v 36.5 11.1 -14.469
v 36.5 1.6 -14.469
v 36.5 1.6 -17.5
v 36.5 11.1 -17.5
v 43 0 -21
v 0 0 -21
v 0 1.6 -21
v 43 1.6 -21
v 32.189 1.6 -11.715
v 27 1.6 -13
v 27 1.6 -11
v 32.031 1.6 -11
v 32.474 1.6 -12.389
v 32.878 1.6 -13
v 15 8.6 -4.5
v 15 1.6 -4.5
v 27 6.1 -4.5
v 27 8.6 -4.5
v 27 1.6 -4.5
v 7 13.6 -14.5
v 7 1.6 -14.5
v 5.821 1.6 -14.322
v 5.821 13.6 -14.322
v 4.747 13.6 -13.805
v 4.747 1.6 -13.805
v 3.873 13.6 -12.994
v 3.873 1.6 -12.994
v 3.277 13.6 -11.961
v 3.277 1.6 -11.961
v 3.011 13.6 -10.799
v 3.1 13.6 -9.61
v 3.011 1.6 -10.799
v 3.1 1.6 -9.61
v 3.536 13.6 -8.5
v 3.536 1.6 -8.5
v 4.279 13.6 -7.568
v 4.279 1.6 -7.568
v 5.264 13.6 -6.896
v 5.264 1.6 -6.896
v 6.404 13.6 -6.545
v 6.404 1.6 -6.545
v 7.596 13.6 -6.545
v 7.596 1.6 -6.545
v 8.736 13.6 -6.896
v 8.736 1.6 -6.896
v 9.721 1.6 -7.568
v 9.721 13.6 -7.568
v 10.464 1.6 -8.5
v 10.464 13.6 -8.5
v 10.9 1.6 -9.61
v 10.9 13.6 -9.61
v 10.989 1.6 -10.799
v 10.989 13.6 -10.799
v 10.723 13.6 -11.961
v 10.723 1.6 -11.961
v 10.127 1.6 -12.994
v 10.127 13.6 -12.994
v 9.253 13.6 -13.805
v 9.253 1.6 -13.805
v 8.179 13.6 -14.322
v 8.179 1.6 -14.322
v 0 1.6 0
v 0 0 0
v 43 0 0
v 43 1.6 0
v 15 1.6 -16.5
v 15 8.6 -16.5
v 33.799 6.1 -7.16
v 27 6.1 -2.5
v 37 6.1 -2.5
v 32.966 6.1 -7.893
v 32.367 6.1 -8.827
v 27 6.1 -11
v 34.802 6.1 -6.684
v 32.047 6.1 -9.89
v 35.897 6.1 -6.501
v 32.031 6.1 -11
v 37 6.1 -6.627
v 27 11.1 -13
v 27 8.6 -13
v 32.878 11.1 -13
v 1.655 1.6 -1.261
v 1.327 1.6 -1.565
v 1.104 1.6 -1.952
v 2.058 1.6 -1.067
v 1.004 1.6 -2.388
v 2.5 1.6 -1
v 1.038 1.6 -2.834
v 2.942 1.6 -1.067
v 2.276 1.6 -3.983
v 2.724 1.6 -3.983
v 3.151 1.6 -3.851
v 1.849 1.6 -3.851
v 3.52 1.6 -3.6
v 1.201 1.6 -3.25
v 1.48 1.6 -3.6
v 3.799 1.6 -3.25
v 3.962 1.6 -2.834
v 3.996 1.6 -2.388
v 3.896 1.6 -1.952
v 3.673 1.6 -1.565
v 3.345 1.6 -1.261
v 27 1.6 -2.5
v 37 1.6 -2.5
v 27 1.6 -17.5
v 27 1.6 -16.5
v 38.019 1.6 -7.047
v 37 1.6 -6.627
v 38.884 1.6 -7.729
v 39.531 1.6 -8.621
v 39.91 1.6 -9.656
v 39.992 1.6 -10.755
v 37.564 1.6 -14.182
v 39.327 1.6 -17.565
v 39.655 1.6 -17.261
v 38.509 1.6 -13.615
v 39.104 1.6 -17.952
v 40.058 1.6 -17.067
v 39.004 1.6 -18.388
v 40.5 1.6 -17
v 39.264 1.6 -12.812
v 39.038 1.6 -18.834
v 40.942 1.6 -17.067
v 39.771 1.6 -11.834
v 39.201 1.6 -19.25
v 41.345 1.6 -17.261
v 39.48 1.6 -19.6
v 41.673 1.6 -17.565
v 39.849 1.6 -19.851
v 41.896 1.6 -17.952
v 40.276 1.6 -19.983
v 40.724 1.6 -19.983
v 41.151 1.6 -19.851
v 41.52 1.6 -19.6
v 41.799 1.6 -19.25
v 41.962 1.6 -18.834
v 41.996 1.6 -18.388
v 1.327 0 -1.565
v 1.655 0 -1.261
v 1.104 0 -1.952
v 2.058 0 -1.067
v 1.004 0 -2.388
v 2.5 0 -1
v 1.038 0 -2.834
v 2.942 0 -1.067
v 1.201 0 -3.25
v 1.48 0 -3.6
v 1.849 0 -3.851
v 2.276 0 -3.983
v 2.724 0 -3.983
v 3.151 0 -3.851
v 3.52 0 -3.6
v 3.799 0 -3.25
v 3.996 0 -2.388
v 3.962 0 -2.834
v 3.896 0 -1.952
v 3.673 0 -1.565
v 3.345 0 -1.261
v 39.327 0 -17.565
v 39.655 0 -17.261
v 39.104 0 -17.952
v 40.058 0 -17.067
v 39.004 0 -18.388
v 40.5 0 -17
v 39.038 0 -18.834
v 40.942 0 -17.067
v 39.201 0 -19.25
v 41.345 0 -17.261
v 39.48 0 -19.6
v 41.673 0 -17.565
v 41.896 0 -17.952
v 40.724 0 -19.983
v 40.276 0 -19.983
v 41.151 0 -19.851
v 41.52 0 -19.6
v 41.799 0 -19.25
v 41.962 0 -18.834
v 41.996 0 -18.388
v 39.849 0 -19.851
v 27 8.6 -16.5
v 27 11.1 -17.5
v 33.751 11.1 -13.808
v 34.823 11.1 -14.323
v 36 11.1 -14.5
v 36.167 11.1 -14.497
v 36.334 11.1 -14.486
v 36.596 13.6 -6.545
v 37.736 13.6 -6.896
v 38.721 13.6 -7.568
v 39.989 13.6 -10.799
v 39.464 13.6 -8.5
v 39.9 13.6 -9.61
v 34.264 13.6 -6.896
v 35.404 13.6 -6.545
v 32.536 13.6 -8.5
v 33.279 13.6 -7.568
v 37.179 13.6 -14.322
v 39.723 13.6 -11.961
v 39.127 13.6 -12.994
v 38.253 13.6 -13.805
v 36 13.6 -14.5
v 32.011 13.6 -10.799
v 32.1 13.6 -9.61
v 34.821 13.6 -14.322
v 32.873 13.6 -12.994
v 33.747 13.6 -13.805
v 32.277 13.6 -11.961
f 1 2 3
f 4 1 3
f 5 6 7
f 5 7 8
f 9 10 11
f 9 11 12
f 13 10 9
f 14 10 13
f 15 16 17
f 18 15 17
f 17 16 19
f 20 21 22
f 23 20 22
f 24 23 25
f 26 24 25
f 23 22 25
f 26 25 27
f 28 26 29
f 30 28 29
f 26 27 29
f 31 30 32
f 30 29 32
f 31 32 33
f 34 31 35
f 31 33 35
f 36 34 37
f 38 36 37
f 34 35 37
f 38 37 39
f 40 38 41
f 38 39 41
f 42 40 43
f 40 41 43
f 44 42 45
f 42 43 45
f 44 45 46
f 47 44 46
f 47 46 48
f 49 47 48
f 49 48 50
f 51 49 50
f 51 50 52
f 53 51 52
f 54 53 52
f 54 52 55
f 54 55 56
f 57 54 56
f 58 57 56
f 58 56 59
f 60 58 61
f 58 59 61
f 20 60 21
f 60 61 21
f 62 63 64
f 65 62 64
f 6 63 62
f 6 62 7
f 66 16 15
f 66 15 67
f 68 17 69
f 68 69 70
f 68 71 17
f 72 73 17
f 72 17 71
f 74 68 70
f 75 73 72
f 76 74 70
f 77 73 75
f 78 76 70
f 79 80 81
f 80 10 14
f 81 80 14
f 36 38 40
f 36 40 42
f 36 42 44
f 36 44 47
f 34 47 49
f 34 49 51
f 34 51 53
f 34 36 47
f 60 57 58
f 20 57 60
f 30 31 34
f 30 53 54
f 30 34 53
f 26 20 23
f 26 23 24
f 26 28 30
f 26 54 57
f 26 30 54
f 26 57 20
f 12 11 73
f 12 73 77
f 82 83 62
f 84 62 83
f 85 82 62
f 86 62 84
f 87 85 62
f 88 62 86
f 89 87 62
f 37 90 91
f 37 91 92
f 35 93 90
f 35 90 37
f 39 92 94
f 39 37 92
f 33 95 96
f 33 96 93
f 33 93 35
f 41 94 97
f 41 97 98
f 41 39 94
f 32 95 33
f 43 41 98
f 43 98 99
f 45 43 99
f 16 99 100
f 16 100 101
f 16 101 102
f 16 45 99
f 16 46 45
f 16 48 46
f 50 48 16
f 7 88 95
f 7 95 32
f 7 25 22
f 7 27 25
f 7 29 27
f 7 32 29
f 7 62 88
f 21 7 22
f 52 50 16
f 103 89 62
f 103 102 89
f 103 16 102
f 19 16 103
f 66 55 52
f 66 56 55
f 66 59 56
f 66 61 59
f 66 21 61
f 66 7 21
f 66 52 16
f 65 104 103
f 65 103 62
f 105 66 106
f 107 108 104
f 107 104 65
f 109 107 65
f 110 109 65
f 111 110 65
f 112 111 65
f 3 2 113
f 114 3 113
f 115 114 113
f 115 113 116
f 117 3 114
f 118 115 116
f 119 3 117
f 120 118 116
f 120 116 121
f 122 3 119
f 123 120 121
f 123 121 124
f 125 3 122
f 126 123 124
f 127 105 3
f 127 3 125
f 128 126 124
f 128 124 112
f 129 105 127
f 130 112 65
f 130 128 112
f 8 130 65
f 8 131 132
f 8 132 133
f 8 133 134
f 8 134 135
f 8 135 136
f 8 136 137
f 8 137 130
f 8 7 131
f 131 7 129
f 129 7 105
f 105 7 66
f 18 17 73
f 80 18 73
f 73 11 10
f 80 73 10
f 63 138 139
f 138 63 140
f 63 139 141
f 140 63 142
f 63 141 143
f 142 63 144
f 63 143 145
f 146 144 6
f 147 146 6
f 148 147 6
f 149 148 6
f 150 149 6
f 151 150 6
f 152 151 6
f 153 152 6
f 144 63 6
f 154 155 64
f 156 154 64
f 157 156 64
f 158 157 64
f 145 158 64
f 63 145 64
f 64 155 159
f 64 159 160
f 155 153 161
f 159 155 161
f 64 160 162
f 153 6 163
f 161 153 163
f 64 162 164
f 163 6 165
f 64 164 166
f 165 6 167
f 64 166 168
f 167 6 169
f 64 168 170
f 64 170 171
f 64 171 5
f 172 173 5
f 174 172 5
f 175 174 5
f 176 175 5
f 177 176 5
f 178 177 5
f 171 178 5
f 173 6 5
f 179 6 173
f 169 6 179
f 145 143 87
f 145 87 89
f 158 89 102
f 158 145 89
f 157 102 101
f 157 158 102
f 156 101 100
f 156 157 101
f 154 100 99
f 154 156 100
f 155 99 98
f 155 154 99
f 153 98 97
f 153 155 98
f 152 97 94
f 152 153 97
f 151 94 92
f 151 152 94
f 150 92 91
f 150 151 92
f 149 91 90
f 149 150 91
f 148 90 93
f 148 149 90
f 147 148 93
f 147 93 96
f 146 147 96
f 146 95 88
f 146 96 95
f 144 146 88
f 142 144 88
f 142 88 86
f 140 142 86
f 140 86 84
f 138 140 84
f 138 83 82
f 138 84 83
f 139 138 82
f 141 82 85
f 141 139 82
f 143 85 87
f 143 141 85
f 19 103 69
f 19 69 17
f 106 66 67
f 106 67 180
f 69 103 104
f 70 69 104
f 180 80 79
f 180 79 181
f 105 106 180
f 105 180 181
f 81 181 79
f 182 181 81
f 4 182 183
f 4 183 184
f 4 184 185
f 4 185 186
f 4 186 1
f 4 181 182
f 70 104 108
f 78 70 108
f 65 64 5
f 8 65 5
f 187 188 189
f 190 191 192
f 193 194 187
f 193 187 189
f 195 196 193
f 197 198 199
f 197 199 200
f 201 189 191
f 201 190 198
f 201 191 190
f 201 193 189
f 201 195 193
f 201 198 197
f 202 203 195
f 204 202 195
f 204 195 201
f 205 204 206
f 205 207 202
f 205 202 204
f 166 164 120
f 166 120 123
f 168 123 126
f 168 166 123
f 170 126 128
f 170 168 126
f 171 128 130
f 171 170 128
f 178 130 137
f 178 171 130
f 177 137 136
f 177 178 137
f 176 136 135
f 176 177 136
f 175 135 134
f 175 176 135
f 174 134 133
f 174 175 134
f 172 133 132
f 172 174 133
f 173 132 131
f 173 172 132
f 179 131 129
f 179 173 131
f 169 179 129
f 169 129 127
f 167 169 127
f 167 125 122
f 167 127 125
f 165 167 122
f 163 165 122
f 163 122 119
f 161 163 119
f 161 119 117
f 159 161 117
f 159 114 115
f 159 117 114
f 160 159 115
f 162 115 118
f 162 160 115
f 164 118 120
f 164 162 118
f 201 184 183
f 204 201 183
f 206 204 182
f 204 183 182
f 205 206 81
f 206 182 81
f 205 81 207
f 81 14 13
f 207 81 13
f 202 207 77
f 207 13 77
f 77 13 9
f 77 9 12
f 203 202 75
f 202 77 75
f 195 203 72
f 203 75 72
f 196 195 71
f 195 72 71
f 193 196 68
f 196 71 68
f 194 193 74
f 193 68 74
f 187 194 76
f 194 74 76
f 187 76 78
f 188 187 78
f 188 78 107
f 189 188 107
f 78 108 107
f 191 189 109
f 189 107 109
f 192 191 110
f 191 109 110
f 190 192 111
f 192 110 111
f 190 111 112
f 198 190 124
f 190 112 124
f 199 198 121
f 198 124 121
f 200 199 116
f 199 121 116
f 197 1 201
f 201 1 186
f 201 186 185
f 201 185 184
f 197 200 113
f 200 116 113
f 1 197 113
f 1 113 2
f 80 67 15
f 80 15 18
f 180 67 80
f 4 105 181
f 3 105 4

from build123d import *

# Parameters (mm, degrees)
SKETCH1_W               = 43
SKETCH1_H               = 21
PCB_DEPTH               = 1.6
MOUNT_HOLE_1_DEPTH      = 48.880685041
MOUNT_HOLE_1_DEPTH_BACK = 48.880685041
SKETCH2_R               = 1.5
MOUNT_HOLE_2_DEPTH      = 48.880685041
MOUNT_HOLE_2_DEPTH_BACK = 48.880685041
SKETCH3_R               = 1.5
INDUCTOR_START          = 1.6
SKETCH4_W               = 12
SKETCH4_H               = 12
INDUCTOR_DEPTH          = 7
CAP_IN_START            = 1.6
SKETCH5_R               = 4
CAP_IN_DEPTH            = 12
CAP_OUT_START           = 1.6
SKETCH6_R               = 4
CAP_OUT_DEPTH           = 12
TRIM_POT_START          = 1.6
SKETCH7_W               = 9.5
SKETCH7_H               = 4.5
TRIM_POT_DEPTH          = 9.5
LM2596S_START           = 1.6
SKETCH8_W               = 10
SKETCH8_H               = 8.5
LM2596S_DEPTH           = 4.5


with BuildPart() as part:
    # Sketch1 → PCB (new body)
    with BuildSketch(Plane(origin=(0, 0, 0), x_dir=(1, 0, 0), z_dir=(0, 1, 0))):
        with Locations((21.5, 10.5)):
            Rectangle(SKETCH1_W, SKETCH1_H)
    extrude(amount=PCB_DEPTH)

    # Sketch2 → Mount_hole_1 (cut, two sides: drawn at the far end of the back side and taken through both)
    with BuildSketch(Plane(origin=(0, 0, 0), x_dir=(1, 0, 0), z_dir=(0, 1, 0)).offset(-MOUNT_HOLE_1_DEPTH_BACK)):
        with Locations(Location((2.5, 2.5, 0), (0, 0, 270))):
            Circle(SKETCH2_R)
    extrude(amount=MOUNT_HOLE_1_DEPTH + MOUNT_HOLE_1_DEPTH_BACK, mode=Mode.SUBTRACT)

    # Sketch3 → Mount_hole_2 (cut, two sides: drawn at the far end of the back side and taken through both)
    with BuildSketch(Plane(origin=(0, 0, 0), x_dir=(1, 0, 0), z_dir=(0, 1, 0)).offset(-MOUNT_HOLE_2_DEPTH_BACK)):
        with Locations(Location((40.5, 18.5, 0), (0, 0, 270))):
            Circle(SKETCH3_R)
    extrude(amount=MOUNT_HOLE_2_DEPTH + MOUNT_HOLE_2_DEPTH_BACK, mode=Mode.SUBTRACT)

    # Sketch4 → Inductor (add)
    with BuildSketch(Plane(origin=(0, 0, 0), x_dir=(1, 0, 0), z_dir=(0, 1, 0)).offset(INDUCTOR_START)):
        with Locations((21, 10.5)):
            Rectangle(SKETCH4_W, SKETCH4_H)
    extrude(amount=INDUCTOR_DEPTH)

    # Sketch5 → Cap_in (add)
    with BuildSketch(Plane(origin=(0, 0, 0), x_dir=(1, 0, 0), z_dir=(0, 1, 0)).offset(CAP_IN_START)):
        with Locations(Location((7, 10.5, 0), (0, 0, 90))):
            Circle(SKETCH5_R)
    extrude(amount=CAP_IN_DEPTH)

    # Sketch6 → Cap_out (add)
    with BuildSketch(Plane(origin=(0, 0, 0), x_dir=(1, 0, 0), z_dir=(0, 1, 0)).offset(CAP_OUT_START)):
        with Locations(Location((36, 10.5, 0), (0, 0, 90))):
            Circle(SKETCH6_R)
    extrude(amount=CAP_OUT_DEPTH)

    # Sketch7 → Trim_pot (add)
    with BuildSketch(Plane(origin=(0, 0, 0), x_dir=(1, 0, 0), z_dir=(0, 1, 0)).offset(TRIM_POT_START)):
        with Locations((31.75, 15.25)):
            Rectangle(SKETCH7_W, SKETCH7_H)
    extrude(amount=TRIM_POT_DEPTH)

    # Sketch8 → LM2596S (add)
    with BuildSketch(Plane(origin=(0, 0, 0), x_dir=(1, 0, 0), z_dir=(0, 1, 0)).offset(LM2596S_START)):
        with Locations((32, 6.75)):
            Rectangle(SKETCH8_W, SKETCH8_H)
    extrude(amount=LM2596S_DEPTH)


solid = part.part
